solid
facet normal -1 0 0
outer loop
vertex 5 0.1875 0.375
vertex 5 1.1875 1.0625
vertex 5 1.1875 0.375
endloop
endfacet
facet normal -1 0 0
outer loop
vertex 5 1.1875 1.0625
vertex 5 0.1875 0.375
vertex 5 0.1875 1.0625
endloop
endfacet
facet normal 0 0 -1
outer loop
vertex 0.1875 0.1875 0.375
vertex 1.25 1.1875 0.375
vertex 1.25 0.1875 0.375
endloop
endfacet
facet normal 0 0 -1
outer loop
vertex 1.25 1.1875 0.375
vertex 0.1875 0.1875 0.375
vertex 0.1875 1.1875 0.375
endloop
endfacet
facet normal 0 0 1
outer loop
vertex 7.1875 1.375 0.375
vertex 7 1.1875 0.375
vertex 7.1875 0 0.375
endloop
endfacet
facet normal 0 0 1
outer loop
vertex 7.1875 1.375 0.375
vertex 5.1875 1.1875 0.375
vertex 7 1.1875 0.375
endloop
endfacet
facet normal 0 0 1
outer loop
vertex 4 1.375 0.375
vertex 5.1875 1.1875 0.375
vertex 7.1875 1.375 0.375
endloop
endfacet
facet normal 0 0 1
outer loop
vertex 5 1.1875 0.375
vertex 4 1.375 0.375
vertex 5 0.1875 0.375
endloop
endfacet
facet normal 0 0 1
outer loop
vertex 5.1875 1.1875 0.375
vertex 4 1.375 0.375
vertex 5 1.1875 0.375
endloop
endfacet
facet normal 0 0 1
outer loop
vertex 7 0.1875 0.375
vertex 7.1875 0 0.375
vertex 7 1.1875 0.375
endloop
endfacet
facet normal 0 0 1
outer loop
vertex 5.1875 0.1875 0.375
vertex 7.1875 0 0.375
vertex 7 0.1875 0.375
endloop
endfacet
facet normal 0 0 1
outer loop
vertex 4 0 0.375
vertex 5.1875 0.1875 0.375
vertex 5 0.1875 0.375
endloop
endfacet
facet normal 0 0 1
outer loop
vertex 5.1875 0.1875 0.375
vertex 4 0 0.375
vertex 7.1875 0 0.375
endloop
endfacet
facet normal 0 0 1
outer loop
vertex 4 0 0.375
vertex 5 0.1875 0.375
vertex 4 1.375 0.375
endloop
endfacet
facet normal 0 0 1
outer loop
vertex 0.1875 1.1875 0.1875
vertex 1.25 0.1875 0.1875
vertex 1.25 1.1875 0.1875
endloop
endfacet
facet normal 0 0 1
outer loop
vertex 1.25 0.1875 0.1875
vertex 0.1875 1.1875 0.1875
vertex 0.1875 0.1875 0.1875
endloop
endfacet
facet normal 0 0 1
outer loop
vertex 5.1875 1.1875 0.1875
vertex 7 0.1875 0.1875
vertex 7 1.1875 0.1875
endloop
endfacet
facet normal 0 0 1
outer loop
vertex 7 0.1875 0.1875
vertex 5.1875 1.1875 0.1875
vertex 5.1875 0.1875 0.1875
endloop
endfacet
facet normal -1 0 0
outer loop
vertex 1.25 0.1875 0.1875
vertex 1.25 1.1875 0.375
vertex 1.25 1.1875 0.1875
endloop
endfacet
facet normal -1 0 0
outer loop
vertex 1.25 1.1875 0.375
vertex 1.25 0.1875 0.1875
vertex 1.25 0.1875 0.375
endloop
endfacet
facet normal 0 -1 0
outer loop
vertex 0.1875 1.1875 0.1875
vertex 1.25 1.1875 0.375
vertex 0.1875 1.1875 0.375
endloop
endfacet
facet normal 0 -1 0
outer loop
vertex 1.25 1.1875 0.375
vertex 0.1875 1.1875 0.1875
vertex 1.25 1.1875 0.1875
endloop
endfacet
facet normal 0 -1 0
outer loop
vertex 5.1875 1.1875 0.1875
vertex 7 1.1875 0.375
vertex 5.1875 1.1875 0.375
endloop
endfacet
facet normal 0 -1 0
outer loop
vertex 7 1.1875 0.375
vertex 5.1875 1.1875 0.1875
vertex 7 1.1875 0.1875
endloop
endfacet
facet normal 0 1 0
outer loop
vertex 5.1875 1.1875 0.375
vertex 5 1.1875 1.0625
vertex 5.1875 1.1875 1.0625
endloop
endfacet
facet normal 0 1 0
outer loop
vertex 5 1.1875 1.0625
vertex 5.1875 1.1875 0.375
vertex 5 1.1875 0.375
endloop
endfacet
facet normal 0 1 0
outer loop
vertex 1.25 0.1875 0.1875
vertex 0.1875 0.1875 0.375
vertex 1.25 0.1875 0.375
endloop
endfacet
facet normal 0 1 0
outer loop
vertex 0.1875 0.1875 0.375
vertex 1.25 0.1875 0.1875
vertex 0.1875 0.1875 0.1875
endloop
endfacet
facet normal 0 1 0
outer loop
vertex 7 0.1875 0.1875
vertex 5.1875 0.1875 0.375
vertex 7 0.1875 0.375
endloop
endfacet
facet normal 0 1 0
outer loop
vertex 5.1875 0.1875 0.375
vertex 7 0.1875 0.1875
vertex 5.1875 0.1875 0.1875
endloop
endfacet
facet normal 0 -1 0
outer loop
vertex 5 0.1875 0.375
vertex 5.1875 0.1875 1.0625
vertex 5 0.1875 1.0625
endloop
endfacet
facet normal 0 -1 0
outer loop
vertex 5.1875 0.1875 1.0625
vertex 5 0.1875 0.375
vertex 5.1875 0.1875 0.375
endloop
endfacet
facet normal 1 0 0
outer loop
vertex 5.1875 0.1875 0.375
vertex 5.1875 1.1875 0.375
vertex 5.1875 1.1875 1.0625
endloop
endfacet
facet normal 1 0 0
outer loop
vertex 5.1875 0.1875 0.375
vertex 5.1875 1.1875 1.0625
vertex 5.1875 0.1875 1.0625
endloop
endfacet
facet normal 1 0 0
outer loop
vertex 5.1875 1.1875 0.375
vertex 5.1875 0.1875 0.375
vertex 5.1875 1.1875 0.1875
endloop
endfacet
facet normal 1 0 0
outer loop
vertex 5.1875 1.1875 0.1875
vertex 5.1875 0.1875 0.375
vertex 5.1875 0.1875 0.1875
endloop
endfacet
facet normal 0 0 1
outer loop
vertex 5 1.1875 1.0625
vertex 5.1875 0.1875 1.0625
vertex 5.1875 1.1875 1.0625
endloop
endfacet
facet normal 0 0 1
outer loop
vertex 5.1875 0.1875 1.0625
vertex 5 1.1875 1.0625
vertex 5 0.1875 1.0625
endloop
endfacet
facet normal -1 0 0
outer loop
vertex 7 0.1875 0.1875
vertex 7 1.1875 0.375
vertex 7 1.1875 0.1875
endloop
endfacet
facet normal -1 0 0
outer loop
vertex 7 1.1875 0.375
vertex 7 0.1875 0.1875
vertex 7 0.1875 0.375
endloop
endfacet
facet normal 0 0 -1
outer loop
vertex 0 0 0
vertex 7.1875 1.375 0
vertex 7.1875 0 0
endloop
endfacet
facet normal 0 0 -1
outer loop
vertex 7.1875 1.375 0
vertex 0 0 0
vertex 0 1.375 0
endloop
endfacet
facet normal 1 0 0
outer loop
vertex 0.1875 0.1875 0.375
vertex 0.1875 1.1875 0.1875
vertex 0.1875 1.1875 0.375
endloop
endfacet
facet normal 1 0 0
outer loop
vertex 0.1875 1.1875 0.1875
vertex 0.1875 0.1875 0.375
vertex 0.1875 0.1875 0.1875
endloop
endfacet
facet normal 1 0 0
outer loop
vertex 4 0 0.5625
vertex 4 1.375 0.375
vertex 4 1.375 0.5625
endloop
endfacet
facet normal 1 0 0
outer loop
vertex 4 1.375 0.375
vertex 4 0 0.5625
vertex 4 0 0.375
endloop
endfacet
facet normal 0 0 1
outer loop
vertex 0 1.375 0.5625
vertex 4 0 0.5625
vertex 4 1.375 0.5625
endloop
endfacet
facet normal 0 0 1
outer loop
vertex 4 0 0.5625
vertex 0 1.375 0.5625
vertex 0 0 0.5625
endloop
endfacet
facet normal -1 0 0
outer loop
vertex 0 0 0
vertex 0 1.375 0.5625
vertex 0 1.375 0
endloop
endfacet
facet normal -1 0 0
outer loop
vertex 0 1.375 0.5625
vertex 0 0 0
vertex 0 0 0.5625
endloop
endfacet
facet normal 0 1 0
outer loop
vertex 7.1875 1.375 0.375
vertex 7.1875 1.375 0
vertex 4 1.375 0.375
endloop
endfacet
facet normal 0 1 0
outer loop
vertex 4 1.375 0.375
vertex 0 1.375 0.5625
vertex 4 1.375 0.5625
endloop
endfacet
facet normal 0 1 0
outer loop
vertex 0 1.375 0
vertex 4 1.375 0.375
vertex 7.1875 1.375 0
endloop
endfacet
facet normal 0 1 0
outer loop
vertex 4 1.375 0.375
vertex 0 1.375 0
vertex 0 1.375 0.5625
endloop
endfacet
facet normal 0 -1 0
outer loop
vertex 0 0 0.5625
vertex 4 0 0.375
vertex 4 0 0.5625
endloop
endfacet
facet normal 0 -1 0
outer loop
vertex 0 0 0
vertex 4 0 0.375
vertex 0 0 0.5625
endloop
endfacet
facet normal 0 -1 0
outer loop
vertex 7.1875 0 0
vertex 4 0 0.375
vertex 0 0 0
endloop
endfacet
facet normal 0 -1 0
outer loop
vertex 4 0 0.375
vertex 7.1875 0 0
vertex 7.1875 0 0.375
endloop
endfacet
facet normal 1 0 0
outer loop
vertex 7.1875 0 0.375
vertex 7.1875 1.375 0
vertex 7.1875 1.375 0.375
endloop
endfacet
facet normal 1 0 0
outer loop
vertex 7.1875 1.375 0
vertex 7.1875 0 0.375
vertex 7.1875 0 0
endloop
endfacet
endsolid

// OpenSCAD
module dish_sign(mat_width, disp_length=7, disp_height=1){
    //Base
    translate([mat_width, mat_width, 0]) cube([disp_length - mat_width, disp_height, mat_width]); //Back
    translate([0, 0, mat_width * 2]) cube([(4.0/7.0) * disp_length, disp_height + 2 * mat_width, mat_width]); //Front
    cube([mat_width, disp_height + 2 * mat_width, 2 * mat_width]); //Left
    translate([disp_length, 0, 0]) cube([mat_width, disp_height + 2 * mat_width, 2 * mat_width]); //Right
    translate([mat_width, disp_height + mat_width, 0]) cube([disp_length - mat_width, mat_width, 2 * mat_width]); //Top
    translate([mat_width, 0, 0]) cube([disp_length - mat_width, mat_width, 2 * mat_width]); //Bottom

    //Slider
    translate([1.25, mat_width, mat_width]) color([1,0,0]) union(){
        cube([(4.0/7.0) * disp_length - (.25/7.0) * disp_length, disp_height, mat_width]); //Base
        translate([(4.0/7.0) * disp_length - (.25/7.0) * disp_length, 0, 0]) cube([mat_width, disp_height, (14.0/3.0) * mat_width]); //End
    }
}

dish_sign(.1875);
